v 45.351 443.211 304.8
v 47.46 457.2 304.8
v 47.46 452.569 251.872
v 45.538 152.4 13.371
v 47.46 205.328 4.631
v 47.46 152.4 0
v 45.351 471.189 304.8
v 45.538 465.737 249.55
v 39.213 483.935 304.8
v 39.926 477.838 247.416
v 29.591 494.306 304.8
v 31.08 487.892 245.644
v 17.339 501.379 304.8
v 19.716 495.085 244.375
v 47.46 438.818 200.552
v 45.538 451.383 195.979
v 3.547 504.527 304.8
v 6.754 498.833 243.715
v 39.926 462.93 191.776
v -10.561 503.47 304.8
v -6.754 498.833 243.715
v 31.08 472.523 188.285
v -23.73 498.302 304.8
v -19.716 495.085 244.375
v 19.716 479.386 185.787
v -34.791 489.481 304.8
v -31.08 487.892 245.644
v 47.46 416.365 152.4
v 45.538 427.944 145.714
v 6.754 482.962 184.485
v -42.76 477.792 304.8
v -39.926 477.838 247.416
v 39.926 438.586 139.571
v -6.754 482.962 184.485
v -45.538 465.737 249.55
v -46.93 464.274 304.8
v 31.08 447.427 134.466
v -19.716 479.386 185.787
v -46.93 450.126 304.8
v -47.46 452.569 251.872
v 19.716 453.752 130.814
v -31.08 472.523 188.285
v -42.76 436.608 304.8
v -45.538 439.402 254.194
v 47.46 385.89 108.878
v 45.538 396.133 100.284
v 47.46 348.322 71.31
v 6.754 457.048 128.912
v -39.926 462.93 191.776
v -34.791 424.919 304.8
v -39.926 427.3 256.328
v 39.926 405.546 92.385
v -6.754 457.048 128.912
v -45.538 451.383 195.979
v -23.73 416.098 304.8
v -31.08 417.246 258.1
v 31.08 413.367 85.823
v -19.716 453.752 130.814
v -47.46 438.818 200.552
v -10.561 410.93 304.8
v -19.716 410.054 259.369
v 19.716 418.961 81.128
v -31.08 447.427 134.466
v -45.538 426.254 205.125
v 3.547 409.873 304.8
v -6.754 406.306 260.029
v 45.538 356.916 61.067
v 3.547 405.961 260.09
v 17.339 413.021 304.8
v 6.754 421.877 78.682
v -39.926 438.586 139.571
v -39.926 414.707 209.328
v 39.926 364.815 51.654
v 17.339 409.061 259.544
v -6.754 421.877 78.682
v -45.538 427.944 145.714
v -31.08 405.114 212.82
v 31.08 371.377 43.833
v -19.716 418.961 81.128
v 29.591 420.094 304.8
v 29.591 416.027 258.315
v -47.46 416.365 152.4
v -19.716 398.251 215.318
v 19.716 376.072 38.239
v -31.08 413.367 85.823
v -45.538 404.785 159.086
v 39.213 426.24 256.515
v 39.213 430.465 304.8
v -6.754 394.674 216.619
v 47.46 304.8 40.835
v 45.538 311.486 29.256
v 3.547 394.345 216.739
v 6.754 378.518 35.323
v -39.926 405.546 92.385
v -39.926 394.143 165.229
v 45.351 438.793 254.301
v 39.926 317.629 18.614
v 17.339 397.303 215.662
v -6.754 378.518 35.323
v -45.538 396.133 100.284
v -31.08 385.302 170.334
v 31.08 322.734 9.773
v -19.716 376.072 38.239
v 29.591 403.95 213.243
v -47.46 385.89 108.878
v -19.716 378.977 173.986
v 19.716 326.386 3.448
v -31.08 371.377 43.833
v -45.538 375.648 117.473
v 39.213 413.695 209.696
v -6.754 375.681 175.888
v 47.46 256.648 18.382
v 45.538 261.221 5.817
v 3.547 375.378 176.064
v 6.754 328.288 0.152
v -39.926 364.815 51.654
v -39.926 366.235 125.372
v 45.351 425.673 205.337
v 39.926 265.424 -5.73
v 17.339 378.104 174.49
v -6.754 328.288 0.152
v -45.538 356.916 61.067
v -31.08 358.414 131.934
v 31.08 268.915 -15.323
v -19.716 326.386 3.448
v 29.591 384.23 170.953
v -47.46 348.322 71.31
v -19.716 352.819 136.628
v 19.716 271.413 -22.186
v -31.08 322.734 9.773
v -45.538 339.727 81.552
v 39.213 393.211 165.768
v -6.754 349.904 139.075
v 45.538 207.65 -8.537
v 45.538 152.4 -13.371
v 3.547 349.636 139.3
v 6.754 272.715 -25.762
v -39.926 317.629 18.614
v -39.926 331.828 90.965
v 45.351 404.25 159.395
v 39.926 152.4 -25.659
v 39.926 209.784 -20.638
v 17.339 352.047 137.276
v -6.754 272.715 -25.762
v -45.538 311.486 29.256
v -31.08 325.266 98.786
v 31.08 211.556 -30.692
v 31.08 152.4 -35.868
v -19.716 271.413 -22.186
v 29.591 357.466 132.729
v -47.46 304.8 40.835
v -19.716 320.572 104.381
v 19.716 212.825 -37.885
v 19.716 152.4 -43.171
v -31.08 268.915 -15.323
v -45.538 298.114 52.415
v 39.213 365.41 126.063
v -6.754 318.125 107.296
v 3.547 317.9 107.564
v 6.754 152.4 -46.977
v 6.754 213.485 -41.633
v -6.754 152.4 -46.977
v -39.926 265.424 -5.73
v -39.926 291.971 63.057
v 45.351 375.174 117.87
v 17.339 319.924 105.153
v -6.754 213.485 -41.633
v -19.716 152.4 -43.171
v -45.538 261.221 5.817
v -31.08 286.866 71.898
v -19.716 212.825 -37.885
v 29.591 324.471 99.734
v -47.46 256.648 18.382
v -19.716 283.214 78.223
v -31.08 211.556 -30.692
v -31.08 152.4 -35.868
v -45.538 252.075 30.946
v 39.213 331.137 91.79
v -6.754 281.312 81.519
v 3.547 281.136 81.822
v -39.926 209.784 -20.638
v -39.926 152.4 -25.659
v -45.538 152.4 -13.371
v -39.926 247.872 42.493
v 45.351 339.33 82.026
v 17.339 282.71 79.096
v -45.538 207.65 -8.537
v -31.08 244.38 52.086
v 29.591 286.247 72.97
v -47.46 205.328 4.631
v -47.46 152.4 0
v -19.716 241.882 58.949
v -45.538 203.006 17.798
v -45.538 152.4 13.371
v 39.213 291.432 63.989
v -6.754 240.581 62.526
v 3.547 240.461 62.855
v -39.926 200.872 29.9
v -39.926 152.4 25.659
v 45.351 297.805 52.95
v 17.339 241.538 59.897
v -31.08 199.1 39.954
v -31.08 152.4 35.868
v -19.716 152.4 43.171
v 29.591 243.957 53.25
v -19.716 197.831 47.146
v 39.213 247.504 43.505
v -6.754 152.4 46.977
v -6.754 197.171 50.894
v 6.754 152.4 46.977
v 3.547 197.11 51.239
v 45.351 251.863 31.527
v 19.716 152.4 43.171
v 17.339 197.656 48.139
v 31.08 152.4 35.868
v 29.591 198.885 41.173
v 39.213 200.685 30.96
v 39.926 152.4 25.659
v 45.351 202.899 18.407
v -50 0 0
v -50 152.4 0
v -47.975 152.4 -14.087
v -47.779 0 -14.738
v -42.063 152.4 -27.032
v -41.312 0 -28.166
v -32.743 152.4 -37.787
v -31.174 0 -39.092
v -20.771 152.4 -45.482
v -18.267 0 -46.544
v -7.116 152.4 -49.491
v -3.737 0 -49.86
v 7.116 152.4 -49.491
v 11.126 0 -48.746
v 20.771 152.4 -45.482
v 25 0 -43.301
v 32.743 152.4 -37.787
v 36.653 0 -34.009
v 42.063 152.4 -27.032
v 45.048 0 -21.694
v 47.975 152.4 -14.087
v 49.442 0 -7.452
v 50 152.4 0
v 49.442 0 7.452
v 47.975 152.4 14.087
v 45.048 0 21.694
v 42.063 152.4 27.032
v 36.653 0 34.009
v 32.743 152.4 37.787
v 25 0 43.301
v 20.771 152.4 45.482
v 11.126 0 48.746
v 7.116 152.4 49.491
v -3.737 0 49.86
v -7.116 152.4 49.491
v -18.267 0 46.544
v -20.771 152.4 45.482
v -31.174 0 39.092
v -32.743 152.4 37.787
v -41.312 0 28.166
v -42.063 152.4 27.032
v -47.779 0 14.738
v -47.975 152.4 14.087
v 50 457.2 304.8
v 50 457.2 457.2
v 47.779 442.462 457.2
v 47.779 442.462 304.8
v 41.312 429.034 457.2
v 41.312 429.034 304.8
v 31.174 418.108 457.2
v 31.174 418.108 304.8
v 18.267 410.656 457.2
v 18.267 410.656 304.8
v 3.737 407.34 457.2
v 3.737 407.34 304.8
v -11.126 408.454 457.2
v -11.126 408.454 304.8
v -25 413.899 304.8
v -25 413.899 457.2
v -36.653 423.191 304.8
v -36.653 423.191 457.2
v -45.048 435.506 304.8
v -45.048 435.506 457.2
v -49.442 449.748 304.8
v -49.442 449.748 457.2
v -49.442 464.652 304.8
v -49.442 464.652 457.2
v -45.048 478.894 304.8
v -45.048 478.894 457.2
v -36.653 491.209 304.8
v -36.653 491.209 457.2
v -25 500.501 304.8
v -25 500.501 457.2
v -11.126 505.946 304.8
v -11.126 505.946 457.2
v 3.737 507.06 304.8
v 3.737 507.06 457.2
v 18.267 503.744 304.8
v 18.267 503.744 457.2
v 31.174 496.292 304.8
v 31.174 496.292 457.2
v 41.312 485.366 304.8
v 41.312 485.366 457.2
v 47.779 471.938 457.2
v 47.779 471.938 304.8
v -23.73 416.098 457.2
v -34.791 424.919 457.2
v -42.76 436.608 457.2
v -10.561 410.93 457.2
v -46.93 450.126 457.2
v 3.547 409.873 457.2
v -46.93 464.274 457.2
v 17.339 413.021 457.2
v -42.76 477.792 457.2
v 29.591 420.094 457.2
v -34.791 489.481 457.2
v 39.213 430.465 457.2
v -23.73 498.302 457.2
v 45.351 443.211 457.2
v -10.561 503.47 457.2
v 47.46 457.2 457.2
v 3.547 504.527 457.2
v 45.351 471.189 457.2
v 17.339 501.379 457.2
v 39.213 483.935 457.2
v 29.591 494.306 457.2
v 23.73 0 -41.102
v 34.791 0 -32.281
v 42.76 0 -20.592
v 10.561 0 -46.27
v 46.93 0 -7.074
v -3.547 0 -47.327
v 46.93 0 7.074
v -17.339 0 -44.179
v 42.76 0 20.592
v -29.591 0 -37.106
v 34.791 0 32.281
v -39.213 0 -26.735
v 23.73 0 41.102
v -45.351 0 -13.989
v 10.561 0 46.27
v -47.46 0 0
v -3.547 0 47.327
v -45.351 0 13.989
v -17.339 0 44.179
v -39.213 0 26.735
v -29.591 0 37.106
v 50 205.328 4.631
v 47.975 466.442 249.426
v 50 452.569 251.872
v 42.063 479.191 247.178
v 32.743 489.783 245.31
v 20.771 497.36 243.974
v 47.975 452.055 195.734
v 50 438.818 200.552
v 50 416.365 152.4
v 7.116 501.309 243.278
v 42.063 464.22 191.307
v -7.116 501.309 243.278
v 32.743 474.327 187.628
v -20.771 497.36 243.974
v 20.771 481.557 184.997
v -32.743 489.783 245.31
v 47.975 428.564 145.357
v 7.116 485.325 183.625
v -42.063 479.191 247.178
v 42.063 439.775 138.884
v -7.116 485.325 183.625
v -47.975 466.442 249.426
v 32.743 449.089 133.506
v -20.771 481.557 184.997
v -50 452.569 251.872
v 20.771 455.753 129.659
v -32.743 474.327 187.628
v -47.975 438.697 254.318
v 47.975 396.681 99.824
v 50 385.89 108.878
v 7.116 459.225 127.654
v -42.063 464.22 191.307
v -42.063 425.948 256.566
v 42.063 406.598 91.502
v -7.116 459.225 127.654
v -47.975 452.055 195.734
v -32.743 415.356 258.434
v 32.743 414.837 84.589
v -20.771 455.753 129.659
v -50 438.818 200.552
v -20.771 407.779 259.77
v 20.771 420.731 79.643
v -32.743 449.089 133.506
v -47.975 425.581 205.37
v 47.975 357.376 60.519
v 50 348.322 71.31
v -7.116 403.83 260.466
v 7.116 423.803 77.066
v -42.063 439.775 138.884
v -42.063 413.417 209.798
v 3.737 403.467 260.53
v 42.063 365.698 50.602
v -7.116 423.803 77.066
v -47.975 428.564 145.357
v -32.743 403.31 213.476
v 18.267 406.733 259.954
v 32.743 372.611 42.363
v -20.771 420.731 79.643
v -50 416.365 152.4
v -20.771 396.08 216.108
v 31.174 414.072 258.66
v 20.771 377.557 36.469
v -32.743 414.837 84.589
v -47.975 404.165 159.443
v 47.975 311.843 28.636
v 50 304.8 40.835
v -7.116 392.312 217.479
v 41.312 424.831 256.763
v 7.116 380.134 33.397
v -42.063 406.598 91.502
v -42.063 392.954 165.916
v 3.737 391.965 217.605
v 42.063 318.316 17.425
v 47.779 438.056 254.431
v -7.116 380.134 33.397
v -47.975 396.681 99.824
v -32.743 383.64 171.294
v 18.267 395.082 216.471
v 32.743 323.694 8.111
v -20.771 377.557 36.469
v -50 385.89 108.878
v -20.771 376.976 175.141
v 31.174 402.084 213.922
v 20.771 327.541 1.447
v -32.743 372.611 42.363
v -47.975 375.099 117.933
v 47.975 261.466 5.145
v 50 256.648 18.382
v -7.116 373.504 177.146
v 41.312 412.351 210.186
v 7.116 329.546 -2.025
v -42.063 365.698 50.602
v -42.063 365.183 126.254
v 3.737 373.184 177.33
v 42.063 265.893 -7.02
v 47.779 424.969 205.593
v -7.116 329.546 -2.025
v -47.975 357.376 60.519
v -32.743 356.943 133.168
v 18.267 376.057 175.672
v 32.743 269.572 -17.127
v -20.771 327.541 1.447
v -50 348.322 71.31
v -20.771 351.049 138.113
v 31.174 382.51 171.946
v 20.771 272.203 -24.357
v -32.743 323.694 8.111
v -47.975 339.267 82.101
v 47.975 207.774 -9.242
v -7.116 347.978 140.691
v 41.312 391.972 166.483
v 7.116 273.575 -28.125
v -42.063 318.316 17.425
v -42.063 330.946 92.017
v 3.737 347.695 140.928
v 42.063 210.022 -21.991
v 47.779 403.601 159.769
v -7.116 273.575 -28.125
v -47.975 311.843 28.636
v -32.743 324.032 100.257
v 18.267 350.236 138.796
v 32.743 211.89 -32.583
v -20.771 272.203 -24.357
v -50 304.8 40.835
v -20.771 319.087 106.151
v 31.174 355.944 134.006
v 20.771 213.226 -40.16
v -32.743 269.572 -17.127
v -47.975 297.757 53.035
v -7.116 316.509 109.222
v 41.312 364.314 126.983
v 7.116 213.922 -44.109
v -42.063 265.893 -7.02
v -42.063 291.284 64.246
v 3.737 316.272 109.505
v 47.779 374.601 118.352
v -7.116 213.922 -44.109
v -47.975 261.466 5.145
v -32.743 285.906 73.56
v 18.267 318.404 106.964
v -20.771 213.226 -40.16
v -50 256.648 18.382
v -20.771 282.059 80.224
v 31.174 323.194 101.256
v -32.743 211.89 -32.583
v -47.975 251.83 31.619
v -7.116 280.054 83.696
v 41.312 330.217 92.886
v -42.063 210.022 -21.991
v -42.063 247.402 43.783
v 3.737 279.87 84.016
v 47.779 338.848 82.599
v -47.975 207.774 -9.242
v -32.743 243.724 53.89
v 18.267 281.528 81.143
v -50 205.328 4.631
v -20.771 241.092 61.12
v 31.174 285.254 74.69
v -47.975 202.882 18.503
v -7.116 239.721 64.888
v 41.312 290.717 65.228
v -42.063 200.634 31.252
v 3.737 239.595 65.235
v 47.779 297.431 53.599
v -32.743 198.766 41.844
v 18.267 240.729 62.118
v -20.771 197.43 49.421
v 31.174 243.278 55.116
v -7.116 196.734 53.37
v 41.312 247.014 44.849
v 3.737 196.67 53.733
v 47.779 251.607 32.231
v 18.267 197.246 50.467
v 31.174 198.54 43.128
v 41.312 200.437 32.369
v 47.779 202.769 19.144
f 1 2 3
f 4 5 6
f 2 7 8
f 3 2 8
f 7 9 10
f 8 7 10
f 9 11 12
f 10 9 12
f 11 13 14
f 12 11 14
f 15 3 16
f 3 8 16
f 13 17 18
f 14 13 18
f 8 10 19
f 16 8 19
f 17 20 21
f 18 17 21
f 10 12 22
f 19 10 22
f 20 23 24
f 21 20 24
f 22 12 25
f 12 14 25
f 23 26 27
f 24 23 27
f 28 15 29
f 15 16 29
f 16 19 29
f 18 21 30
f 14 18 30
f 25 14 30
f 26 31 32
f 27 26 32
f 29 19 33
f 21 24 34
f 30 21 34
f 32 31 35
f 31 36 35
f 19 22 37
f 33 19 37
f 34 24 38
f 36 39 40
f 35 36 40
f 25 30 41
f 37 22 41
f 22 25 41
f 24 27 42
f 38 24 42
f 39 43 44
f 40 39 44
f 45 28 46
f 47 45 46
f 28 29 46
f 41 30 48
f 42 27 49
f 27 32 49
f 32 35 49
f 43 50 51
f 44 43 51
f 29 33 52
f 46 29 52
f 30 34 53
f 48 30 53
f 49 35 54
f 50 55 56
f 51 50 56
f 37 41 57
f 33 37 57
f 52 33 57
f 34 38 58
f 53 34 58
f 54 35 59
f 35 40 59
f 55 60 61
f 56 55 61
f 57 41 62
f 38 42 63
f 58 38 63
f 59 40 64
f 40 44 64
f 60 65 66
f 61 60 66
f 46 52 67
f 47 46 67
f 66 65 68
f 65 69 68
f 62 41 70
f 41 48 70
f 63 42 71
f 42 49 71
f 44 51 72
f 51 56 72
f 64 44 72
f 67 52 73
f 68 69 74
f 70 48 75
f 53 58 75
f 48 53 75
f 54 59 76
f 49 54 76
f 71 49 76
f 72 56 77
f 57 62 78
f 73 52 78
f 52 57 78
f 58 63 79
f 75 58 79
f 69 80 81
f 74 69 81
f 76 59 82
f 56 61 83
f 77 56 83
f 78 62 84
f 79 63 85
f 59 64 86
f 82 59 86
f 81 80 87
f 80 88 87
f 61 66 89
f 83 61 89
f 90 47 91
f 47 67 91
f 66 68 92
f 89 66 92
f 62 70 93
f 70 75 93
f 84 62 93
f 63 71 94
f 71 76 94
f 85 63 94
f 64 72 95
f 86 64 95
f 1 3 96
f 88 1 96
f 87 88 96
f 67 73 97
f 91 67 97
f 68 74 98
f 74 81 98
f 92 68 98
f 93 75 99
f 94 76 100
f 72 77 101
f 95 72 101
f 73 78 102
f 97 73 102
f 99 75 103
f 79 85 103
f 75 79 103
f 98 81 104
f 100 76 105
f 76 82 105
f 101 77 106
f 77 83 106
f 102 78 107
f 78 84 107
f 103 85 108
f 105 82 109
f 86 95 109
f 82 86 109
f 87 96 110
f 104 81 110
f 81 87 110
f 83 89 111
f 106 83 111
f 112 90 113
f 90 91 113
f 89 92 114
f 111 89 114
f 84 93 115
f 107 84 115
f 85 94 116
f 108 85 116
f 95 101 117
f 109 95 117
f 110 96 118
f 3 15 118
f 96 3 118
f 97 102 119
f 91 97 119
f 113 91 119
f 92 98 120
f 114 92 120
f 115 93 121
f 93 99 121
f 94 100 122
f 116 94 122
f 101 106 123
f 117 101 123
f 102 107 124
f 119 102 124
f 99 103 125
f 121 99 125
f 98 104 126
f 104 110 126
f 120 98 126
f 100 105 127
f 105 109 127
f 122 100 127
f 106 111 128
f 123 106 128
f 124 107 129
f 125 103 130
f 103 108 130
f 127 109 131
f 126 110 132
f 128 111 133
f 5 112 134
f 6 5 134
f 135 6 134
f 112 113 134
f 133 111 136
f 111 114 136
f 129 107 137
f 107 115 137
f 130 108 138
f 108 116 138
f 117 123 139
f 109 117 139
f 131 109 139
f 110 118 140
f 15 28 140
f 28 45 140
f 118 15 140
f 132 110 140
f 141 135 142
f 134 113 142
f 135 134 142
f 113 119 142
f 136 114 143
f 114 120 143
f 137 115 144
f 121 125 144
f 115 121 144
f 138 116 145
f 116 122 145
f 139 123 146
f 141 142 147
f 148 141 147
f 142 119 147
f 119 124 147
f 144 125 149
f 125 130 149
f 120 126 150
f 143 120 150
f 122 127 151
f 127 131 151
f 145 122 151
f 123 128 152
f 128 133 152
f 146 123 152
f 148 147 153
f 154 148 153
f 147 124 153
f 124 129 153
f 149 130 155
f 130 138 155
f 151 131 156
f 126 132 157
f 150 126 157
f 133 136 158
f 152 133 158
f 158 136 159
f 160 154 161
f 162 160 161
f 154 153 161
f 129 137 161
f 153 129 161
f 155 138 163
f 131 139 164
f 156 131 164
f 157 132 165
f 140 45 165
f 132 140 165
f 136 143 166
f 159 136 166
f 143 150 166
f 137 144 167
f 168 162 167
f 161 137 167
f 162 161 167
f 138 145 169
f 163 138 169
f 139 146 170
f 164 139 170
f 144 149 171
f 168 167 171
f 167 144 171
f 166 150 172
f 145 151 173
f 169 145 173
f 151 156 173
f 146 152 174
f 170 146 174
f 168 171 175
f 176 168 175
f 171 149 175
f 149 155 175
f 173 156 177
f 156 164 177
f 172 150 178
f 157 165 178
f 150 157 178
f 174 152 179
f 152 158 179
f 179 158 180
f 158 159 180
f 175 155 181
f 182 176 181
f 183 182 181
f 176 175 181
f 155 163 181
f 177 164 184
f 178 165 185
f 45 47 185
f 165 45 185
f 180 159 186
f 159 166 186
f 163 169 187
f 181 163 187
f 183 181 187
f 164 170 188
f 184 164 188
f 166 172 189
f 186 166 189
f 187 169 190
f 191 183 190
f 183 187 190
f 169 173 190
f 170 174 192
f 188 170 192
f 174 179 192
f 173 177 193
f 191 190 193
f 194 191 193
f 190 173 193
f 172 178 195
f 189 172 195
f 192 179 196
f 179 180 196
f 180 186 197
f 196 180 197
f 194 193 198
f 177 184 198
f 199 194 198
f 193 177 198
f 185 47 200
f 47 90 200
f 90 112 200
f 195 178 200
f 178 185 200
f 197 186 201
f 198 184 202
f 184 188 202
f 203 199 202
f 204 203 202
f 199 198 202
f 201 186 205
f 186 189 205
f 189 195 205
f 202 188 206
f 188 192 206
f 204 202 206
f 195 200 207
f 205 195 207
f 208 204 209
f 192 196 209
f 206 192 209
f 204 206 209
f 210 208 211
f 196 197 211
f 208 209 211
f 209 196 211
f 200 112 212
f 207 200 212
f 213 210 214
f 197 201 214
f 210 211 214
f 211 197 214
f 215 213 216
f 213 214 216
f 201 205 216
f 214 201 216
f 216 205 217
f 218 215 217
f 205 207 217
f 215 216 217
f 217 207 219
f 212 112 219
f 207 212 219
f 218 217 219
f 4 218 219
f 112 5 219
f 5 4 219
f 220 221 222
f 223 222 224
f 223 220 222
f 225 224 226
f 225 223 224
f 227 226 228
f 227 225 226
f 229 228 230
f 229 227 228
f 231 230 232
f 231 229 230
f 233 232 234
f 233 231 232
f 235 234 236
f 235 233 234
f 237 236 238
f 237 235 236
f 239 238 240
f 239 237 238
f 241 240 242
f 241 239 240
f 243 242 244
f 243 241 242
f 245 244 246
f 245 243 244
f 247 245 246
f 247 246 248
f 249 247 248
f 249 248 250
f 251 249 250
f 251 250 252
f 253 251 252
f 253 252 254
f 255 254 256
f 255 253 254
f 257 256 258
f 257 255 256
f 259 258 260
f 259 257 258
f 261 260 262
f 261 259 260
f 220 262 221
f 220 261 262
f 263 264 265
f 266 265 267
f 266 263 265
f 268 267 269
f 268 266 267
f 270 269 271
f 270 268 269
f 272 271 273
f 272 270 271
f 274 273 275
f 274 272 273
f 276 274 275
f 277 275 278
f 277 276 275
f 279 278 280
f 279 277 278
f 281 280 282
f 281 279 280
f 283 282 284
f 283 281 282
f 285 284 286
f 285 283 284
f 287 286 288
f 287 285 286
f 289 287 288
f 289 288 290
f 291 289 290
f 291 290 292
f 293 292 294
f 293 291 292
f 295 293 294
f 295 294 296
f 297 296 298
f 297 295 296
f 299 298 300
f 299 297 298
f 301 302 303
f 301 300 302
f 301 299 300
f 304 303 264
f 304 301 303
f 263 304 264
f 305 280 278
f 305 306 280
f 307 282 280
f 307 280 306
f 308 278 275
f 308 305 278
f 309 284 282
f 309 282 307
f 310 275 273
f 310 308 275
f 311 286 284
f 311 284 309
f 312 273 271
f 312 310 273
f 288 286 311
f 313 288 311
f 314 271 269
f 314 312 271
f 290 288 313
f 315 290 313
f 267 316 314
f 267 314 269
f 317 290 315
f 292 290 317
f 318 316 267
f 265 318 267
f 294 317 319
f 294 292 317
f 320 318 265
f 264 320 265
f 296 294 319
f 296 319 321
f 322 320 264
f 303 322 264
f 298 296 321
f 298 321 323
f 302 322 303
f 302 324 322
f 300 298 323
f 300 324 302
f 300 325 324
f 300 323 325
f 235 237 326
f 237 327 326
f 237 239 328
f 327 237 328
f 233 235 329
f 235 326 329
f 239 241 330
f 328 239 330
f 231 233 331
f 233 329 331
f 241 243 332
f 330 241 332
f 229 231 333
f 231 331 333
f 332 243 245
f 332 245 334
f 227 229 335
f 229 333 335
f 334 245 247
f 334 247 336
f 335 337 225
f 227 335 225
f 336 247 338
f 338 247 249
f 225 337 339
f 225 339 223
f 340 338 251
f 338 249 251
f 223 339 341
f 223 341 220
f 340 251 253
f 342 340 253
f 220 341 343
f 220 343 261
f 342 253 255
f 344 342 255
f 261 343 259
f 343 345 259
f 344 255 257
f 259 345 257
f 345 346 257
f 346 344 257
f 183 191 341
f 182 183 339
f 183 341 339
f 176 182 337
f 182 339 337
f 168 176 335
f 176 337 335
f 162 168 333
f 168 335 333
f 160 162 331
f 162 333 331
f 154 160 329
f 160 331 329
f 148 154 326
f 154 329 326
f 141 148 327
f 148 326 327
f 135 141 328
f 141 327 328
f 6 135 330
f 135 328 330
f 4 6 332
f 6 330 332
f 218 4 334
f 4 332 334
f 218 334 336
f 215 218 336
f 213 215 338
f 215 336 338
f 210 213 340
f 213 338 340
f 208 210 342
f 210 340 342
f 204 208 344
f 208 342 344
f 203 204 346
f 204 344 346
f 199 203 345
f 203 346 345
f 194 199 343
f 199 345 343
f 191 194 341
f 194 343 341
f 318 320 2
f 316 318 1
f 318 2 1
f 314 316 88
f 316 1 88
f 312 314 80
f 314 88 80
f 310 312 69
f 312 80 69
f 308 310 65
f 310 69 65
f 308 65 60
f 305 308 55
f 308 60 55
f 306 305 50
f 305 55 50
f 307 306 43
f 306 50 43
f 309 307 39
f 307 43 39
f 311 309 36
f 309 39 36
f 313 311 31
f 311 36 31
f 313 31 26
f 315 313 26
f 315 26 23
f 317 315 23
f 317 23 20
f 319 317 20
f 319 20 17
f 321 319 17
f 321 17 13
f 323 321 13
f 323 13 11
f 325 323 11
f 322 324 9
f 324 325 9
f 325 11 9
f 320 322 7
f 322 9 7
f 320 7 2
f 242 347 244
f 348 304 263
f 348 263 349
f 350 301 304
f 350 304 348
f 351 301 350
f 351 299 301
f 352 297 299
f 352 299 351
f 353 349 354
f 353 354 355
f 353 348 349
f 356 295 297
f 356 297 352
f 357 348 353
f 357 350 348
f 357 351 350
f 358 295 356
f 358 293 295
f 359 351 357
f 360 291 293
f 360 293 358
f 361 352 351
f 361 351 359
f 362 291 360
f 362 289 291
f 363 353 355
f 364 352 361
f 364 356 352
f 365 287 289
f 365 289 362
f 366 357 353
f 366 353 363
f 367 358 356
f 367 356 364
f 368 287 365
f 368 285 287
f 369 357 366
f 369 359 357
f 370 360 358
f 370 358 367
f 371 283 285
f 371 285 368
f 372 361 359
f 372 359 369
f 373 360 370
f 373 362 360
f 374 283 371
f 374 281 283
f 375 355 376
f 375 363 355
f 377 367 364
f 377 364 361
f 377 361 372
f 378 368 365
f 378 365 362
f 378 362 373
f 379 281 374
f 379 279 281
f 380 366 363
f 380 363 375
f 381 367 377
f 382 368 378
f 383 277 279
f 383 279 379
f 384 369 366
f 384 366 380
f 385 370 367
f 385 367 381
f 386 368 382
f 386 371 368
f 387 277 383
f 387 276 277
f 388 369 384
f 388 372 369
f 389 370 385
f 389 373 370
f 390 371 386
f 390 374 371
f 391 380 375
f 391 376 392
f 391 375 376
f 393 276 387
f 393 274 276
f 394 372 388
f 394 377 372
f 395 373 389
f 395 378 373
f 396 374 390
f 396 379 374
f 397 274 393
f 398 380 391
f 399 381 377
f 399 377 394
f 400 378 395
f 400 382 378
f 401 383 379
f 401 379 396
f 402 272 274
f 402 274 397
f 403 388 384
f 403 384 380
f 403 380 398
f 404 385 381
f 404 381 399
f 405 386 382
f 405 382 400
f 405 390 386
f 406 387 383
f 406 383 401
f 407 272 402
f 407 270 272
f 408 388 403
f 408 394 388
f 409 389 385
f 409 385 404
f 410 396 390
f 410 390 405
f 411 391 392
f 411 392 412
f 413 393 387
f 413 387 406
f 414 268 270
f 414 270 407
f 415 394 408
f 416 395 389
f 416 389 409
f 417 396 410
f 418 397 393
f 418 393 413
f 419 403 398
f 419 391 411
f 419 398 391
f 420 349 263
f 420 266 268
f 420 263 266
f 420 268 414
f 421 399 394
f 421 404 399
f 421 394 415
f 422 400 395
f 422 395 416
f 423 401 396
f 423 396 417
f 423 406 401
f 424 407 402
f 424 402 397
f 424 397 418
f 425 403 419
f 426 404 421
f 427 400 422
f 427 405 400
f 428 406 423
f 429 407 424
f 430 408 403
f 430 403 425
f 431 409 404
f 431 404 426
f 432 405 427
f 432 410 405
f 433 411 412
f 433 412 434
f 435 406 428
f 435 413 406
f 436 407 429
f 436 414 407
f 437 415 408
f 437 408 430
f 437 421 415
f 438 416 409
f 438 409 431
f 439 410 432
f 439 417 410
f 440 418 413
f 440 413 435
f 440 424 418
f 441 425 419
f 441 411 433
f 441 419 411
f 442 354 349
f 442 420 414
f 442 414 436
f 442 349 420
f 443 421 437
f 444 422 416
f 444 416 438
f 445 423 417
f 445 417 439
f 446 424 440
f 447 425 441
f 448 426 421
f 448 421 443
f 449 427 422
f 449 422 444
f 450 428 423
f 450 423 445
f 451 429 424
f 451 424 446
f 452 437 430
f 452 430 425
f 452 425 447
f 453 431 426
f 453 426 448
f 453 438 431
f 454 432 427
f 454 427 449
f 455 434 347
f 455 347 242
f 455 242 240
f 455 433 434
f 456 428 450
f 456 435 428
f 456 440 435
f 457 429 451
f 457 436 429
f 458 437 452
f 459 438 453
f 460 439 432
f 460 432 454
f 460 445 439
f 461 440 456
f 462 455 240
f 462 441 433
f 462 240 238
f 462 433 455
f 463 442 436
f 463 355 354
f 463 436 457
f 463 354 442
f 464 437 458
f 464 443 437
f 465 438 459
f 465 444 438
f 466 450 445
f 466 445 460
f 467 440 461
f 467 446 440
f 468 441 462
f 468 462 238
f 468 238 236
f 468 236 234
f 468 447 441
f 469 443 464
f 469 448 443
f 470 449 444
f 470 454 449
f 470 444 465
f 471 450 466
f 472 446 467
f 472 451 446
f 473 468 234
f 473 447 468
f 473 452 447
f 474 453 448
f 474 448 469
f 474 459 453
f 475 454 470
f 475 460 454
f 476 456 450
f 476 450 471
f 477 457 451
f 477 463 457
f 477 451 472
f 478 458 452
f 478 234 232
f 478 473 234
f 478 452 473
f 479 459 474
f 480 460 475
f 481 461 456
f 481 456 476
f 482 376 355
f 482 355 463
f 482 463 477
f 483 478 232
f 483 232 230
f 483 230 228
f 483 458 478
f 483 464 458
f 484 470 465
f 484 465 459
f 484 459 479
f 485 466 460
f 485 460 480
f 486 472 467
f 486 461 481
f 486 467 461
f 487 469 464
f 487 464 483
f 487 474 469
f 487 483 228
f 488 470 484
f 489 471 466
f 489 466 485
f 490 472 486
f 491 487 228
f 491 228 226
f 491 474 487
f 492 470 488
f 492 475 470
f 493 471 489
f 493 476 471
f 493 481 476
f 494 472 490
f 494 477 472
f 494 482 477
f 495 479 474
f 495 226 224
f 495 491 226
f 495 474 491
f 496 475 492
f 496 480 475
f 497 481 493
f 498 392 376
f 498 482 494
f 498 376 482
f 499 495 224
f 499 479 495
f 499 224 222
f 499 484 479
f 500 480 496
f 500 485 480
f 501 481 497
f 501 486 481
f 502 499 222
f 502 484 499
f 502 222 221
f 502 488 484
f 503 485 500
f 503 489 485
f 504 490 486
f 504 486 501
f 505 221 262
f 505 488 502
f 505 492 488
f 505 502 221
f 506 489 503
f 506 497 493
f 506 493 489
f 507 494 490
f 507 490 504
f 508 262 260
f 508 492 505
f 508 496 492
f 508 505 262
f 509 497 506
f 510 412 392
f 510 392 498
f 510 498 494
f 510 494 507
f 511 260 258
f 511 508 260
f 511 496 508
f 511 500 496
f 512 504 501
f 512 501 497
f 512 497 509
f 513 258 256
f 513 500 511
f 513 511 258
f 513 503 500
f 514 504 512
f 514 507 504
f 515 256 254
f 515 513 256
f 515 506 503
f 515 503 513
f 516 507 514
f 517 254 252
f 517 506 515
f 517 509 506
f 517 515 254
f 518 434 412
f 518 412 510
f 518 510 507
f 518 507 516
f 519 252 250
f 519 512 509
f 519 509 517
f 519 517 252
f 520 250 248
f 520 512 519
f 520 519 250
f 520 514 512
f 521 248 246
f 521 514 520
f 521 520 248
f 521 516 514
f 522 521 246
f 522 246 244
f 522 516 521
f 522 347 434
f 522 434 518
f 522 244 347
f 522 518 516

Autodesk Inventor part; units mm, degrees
ref_plane "YZ Plane" through (0, 0, 0) normal (1, 0, 0) x (0, 1, 0)
ref_plane "XZ Plane" through (0, 0, 0) normal (0, 1, 0) x (-1, 0, 0)
sketch "Sketch1" plane through (0, 0, 0) normal (0, 1, 0) x (-1, 0, 0)
  circle A0 centre (0, 0) radius 50
  circle A1 centre (0, 0) radius 47.46
  dimension "d0" = 100
  dimension "d1" = 2.54
extrude "Extrusion1" add sketch "Sketch1" along normal blind 152.4
sketch "Sketch4" plane through (0, 152.4, 0) normal (0, 1, 0) x (1, 0, 0)
  circle A0 centre (0, 0) radius 47.46 projected
  circle A1 centre (0, 0) radius 50 projected
  point P0 (-50, 0)
ref_plane "Work Plane4" through (-50, 152.4, 0) normal (-1, 0, 0) x (0, -1, 0)
sketch "Sketch8" plane through (-50, 152.4, 0) normal (-1, 0, 0) x (0, -1, 0)
  line L0 (0, 0) -> (0, 304.8) construction
  arc A0 (-304.8, 304.8) -> (0, 0) centre (0, 304.8) ccw
  line L1 (0, 304.8) -> (-304.8, 304.8) construction
  point P0 (152.4, 0)
  dimension "d7" = 304.8
sweep "Sweep1" add profiles "Sketch4" path "Sketch8"
sketch "Sketch9" plane through (0, 457.2, 304.8) normal (0, 0, 1) x (1, 0, 0)
  circle A0 centre (0, 0) radius 47.46 projected
  circle A1 centre (0, 0) radius 50 projected
  point P0 (0, -457.2)
extrude "Extrusion2" add sketch "Sketch9" along normal blind 152.4
properties part number "sweep"
